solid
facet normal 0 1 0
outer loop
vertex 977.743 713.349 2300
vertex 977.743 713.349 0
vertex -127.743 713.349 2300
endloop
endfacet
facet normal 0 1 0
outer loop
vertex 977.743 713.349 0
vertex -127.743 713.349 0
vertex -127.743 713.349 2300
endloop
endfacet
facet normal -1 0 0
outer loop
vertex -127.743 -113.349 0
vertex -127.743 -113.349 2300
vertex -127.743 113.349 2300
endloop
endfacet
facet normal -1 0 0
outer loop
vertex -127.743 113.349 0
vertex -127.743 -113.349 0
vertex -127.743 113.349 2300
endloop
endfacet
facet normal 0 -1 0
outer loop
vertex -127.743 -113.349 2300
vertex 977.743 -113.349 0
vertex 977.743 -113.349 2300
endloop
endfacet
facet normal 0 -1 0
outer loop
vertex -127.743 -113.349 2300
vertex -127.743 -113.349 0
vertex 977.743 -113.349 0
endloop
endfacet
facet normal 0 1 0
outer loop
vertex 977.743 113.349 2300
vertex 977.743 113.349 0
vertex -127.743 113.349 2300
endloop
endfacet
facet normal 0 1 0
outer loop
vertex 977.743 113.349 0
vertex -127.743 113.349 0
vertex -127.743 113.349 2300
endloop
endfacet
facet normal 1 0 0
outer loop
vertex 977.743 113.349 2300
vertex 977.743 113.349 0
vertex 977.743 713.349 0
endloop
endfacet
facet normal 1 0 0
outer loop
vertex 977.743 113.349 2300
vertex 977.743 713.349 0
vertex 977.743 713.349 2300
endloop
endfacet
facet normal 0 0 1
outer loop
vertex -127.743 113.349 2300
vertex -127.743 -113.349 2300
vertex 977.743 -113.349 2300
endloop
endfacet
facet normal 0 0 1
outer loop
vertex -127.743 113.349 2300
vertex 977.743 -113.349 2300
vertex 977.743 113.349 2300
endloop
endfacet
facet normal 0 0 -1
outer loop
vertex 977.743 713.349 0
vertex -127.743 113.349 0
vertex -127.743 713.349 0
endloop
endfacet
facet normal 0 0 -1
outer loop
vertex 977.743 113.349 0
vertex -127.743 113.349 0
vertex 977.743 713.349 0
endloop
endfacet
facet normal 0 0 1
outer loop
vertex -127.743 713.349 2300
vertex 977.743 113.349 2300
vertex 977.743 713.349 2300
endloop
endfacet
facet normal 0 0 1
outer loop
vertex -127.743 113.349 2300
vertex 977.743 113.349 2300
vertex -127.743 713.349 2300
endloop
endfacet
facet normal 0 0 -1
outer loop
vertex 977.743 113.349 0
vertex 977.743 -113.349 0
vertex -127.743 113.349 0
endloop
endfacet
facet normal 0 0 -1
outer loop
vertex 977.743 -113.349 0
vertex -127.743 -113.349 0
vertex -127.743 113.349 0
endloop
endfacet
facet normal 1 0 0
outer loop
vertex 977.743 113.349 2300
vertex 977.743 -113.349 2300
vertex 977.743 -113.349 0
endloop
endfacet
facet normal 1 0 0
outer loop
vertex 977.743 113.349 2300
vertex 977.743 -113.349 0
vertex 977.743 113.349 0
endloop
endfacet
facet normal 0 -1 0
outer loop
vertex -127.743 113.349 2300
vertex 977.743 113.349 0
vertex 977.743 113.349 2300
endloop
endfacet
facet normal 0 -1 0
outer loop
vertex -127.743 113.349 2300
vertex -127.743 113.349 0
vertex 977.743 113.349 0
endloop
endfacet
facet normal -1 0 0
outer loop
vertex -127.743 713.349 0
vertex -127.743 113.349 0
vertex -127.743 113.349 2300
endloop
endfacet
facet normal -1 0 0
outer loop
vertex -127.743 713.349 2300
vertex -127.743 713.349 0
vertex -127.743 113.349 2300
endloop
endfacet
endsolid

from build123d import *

# Parameters (mm, degrees)
F0_W     = 255.48645854
F0_H     = 226.697832346
F1_DEPTH = 2300
F2_DEPTH = 850
F3_DEPTH = 600


with BuildPart() as f1:
    # F0 (on Top) → F1 (new body)
    with BuildSketch(Plane.XY):
        Rectangle(F0_W, F0_H)
    extrude(amount=F1_DEPTH)

    # F2 (add): a face of the model
    f2_faces = [f1.faces().sort_by_distance(p)[0] for p in [
        (127.74322927, 0, 1150),
    ]]
    extrude(f2_faces, amount=F2_DEPTH)


with BuildPart() as f3:
    # F3 (new): a face of the model
    f3_faces = [f1.part.faces().sort_by_distance(p)[0] for p in [
        (425, 113.348916173, 1150),
    ]]
    extrude(f3_faces, amount=F3_DEPTH)


solid = Compound([f1.part, f3.part])
